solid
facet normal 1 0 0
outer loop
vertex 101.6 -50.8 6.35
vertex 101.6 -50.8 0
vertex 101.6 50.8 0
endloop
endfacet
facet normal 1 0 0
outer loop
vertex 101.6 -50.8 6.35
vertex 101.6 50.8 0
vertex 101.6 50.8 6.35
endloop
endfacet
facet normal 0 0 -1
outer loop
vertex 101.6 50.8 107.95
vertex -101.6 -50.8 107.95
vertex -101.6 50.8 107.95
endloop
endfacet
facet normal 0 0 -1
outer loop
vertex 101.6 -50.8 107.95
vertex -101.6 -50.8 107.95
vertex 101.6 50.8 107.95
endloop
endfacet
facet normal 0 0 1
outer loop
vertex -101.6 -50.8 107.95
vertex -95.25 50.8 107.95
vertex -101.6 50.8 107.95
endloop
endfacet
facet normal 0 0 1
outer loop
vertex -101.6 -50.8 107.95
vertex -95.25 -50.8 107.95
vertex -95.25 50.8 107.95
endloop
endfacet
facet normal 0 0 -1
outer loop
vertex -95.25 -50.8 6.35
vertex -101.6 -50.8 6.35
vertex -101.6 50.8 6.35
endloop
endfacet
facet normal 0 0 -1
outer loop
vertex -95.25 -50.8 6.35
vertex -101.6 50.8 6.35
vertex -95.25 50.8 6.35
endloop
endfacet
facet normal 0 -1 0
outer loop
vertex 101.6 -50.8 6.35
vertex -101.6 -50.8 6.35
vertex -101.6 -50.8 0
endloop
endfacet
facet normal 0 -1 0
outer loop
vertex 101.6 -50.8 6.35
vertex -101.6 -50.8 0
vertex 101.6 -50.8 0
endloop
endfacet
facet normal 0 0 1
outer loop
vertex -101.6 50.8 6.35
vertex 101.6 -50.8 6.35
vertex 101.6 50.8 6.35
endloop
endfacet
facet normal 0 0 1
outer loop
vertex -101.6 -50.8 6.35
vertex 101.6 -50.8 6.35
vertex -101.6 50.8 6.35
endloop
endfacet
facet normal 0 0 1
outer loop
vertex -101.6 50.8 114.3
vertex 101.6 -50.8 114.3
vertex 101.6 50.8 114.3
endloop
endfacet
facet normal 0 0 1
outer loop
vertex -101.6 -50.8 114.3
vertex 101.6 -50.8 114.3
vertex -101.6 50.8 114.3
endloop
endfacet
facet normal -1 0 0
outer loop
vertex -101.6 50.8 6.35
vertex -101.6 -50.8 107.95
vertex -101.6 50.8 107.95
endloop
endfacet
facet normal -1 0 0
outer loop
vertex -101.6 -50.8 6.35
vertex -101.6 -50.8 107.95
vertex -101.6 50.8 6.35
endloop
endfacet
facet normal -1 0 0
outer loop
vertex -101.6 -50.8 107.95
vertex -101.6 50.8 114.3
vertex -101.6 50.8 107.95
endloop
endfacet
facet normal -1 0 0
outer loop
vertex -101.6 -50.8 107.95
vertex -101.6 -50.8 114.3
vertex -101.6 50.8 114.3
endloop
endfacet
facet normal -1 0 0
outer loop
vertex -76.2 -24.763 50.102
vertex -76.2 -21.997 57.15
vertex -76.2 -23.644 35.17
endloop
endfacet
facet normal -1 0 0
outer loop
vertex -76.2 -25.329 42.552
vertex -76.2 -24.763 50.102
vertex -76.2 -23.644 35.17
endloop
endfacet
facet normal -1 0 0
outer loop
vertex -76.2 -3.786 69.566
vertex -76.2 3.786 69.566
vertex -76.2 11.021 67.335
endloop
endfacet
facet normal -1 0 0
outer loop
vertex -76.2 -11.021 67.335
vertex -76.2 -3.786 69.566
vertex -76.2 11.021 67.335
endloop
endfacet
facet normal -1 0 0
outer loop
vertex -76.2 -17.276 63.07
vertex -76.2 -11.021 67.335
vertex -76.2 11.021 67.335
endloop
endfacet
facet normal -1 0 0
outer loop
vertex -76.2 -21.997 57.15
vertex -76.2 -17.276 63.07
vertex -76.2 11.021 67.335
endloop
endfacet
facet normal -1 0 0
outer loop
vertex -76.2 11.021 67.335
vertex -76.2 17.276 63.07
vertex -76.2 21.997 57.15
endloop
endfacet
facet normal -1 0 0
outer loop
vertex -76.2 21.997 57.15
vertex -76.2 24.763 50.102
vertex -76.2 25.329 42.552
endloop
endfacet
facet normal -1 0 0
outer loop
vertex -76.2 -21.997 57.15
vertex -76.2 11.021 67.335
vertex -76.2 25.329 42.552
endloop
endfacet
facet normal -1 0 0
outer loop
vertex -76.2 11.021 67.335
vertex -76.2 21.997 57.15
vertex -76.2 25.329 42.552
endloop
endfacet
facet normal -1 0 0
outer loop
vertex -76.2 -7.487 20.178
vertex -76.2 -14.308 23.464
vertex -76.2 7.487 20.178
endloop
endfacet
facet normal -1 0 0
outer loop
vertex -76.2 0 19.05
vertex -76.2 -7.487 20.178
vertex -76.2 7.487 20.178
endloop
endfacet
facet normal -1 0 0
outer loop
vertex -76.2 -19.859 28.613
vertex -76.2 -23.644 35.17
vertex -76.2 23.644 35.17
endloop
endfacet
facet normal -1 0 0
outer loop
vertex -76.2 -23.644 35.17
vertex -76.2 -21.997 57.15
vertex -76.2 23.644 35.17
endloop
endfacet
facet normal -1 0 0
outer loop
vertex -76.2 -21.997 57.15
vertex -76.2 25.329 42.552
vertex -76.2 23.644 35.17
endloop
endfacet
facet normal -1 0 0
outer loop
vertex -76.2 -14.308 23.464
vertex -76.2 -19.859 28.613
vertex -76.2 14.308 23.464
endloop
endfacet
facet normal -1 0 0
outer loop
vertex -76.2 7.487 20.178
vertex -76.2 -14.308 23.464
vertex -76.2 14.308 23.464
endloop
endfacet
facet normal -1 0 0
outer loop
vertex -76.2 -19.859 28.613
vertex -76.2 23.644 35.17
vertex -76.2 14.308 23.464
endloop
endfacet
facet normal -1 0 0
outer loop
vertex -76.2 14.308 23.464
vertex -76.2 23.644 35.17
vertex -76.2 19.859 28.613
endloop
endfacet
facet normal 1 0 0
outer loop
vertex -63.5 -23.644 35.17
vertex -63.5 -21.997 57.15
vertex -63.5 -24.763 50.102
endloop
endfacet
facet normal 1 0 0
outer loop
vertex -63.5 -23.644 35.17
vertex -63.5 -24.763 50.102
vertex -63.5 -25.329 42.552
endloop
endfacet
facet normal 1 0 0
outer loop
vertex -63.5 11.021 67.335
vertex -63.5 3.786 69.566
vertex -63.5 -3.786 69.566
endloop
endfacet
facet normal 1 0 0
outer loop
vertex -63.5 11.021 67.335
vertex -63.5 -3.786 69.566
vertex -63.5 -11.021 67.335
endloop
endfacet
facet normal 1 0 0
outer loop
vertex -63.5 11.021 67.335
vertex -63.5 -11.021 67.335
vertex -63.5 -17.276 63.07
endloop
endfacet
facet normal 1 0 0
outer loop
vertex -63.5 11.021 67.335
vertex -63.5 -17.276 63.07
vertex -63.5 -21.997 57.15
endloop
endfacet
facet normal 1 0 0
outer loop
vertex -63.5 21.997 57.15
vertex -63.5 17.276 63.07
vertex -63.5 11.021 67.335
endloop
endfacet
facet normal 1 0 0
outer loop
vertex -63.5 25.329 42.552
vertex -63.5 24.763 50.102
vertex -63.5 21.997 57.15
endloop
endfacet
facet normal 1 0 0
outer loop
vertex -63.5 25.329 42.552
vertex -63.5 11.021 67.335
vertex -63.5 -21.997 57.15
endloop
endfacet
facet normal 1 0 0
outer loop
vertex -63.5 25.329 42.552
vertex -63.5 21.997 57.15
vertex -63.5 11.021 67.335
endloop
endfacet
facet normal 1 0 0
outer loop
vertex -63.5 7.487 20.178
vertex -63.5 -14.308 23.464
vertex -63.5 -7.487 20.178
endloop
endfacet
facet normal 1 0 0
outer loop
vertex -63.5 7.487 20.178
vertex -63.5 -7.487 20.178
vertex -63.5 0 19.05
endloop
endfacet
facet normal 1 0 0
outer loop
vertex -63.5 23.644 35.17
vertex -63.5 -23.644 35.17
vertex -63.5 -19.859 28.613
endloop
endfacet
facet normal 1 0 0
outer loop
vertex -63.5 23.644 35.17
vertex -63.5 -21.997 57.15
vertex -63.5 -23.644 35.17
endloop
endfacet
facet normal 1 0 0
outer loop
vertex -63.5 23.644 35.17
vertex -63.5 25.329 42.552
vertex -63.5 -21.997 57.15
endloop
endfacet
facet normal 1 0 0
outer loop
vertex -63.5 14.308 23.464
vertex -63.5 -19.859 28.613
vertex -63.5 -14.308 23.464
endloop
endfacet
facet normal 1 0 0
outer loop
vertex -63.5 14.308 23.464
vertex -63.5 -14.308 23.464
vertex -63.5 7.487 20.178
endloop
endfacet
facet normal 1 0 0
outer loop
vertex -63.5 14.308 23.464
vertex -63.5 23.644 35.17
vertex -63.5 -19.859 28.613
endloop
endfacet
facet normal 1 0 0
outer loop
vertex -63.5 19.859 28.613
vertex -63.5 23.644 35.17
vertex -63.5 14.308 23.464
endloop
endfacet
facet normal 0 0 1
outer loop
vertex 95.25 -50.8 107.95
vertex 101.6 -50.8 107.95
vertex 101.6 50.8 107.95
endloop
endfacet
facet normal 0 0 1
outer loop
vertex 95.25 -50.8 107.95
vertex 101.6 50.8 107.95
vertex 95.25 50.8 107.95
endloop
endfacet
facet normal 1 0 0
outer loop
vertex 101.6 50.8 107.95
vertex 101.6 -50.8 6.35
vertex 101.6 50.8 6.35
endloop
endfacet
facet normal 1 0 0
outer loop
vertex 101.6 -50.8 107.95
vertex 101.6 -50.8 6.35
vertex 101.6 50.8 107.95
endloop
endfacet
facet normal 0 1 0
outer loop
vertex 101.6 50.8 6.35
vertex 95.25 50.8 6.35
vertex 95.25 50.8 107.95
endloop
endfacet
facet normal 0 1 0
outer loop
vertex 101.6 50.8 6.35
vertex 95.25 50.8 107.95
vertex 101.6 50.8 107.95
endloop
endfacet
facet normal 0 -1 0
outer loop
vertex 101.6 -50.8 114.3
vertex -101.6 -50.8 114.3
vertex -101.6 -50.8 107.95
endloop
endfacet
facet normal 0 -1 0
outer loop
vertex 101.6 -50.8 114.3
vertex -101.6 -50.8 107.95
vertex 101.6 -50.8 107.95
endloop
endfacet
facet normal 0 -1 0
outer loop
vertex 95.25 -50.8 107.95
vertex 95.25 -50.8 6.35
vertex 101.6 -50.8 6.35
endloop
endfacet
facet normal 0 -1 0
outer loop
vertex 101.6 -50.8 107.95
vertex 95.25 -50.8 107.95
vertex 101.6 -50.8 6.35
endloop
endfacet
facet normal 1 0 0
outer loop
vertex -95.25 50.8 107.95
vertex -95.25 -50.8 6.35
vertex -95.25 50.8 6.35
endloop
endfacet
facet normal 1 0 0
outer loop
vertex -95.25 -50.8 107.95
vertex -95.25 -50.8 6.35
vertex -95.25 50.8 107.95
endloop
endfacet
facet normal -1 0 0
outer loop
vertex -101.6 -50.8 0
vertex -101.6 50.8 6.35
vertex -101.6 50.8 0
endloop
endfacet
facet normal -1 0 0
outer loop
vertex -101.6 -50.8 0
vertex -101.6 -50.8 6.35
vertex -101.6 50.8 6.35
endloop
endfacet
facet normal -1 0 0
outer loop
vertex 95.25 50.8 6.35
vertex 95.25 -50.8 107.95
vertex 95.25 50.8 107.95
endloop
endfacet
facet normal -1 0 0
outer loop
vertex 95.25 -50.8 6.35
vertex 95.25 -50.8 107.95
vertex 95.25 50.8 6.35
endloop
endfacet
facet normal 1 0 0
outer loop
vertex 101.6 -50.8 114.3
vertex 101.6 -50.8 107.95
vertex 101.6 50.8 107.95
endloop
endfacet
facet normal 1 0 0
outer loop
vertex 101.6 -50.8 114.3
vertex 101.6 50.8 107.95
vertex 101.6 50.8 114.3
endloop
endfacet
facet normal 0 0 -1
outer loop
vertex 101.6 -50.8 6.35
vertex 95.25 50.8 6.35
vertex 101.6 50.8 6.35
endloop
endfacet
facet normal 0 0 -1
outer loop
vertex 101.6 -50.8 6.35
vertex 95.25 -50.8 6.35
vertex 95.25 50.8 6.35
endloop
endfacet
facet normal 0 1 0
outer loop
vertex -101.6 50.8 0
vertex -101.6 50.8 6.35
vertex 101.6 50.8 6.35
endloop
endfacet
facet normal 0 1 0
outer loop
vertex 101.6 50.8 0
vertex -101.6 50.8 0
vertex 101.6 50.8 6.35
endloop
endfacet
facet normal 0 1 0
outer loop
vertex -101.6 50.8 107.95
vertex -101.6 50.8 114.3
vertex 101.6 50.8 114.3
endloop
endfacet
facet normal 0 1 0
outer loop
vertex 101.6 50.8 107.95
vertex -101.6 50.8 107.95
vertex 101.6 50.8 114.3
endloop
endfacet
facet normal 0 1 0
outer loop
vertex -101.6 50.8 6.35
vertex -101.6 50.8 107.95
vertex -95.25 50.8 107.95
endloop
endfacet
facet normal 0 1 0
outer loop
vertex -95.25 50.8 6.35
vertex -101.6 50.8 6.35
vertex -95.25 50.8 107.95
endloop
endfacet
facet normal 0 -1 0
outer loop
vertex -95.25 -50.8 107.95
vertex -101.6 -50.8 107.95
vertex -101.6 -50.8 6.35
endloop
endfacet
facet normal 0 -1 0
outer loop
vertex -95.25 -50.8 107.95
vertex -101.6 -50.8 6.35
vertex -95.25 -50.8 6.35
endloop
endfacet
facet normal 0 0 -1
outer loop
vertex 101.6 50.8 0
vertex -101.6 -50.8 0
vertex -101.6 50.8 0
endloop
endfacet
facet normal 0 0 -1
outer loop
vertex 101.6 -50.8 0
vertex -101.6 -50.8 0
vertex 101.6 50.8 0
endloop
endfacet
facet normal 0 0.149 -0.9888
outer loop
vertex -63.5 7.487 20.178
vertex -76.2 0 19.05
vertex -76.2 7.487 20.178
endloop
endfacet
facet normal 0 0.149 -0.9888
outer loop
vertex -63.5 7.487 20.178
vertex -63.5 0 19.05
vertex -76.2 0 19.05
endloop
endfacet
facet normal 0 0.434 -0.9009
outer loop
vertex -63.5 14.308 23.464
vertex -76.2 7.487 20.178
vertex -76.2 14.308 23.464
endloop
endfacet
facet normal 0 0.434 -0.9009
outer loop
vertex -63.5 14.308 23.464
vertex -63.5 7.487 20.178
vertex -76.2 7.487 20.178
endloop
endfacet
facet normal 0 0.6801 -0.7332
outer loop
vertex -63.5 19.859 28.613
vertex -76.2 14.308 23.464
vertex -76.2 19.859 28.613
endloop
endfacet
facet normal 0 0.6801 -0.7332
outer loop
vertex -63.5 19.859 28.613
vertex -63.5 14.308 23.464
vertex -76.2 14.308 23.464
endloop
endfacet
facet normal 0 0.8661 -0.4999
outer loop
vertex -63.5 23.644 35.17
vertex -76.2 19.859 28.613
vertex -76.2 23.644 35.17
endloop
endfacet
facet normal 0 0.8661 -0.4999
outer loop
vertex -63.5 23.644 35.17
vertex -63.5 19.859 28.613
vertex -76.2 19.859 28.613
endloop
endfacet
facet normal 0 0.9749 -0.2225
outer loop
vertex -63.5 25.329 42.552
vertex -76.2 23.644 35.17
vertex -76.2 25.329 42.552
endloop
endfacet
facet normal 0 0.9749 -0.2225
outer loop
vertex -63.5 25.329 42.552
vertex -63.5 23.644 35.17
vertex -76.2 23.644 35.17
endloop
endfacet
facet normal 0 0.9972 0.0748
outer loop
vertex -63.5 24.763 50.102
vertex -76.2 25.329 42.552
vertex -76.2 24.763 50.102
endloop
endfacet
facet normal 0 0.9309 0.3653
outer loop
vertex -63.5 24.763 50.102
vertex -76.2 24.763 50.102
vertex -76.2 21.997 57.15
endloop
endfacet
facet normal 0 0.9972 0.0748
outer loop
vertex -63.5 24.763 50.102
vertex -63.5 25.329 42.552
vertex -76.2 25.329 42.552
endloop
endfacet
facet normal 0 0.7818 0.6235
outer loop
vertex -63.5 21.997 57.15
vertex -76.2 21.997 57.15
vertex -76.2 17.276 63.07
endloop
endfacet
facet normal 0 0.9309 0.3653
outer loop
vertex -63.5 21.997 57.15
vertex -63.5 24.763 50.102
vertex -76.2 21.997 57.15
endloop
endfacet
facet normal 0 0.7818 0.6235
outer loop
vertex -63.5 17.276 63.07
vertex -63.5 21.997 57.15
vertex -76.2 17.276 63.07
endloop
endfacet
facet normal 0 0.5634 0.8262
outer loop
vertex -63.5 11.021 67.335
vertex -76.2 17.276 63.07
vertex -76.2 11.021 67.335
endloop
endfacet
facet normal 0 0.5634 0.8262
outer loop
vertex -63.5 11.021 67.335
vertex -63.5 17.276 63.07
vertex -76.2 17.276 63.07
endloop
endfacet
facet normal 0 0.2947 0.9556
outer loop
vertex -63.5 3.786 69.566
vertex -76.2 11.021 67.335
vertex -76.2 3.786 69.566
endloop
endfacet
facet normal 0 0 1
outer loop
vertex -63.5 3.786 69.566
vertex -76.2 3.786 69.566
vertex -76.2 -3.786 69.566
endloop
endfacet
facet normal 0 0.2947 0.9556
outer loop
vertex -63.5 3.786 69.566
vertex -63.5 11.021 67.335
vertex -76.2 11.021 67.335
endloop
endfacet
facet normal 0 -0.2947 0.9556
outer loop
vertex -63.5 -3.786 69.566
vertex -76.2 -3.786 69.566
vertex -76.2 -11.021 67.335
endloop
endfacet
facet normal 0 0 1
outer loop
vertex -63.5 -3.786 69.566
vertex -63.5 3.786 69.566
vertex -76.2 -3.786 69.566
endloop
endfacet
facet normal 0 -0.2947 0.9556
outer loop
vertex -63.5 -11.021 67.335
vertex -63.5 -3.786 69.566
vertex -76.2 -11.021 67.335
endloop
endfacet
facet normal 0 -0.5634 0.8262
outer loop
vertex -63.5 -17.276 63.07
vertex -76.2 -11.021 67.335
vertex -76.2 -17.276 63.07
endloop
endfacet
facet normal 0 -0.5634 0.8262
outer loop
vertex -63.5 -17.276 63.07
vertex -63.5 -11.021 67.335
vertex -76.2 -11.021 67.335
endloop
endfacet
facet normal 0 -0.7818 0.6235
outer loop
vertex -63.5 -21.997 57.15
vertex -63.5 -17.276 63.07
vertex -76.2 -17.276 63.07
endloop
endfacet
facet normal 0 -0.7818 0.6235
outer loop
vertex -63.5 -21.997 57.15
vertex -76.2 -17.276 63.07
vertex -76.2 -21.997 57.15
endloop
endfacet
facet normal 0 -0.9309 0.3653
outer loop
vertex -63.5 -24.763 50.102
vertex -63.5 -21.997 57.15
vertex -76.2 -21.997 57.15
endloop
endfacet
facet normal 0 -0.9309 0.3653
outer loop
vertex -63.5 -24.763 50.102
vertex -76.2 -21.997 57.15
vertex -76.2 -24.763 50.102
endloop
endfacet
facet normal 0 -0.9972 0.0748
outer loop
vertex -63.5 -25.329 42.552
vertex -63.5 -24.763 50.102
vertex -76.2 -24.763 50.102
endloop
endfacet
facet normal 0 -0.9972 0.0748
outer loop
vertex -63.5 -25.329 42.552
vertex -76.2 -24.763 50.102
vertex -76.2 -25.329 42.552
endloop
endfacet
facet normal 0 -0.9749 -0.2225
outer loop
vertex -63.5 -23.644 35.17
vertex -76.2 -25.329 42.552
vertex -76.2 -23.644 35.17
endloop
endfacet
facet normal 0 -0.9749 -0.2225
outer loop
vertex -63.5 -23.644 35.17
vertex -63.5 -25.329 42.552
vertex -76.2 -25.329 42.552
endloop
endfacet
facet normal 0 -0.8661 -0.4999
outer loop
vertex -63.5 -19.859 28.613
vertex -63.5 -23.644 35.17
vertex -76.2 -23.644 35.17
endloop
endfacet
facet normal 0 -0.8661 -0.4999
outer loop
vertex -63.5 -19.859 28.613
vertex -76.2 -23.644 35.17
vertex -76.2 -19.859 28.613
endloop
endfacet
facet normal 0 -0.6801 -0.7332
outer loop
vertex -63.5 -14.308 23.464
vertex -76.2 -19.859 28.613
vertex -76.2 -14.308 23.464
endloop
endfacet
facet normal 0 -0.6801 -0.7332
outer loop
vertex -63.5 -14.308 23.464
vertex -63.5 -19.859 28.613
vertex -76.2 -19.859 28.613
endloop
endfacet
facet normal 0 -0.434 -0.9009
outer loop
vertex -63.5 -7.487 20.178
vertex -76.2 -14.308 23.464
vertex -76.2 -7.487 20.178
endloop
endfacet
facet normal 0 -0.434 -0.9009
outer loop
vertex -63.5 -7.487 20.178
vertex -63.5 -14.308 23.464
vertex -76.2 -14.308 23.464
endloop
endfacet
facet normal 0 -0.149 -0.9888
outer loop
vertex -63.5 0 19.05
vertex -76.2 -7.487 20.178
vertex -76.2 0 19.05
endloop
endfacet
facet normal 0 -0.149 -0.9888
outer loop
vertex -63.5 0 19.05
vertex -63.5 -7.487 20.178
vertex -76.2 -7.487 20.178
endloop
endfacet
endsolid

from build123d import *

# Parameters (mm, degrees)
F2_DEPTH      = 50.8
F3_DEPTH      = 50.8
F3_DEPTH_BACK = 50.8
F1_W          = 12.7
F1_H          = 25.4


with BuildPart() as f2:
    # F1 (on Front) → F2 (new body, symmetric)
    with BuildSketch(Plane.XZ):
        Polygon((-101.6, 114.3), (-101.6, 107.95), (-95.25, 107.95), (95.25, 107.95), (101.6, 107.95), (101.6, 114.3), align=None)
    extrude(amount=F2_DEPTH, both=True)


with BuildPart() as f2b:
    # F1 (on Front) → F2, piece 2 (new body, symmetric)
    with BuildSketch(Plane.XZ):
        Polygon((-101.6, 6.35), (-101.6, 0), (101.6, 0), (101.6, 6.35), (95.25, 6.35), (-95.25, 6.35), align=None)
    extrude(amount=F2_DEPTH, both=True)


with BuildPart() as f3:
    # F1 (on Front) → F3 (new body, two sides)
    with BuildSketch(Plane.XZ) as f3_sk:
        Polygon((-101.6, 107.95), (-101.6, 6.35), (-95.25, 6.35), (-95.25, 57.15), (-95.25, 107.95), align=None)
    extrude(amount=F3_DEPTH)
    extrude(f3_sk.sketch, amount=-F3_DEPTH_BACK)


with BuildPart() as f3b:
    # F1 (on Front) → F3, piece 2 (new body, two sides)
    with BuildSketch(Plane.XZ) as f3_2_sk:
        Polygon((95.25, 6.35), (101.6, 6.35), (101.6, 107.95), (95.25, 107.95), (95.25, 57.15), align=None)
    extrude(amount=F3_DEPTH)
    extrude(f3_2_sk.sketch, amount=-F3_DEPTH_BACK)


with BuildPart() as f4:
    # F1 (on Front) → F4 (revolve)
    with BuildSketch(Plane.XZ):
        with Locations((-69.85, 31.75)):
            Rectangle(F1_W, F1_H)
    revolve(axis=Axis((-69.85, 0, 44.45), (1, 0, 0)))


solid = Compound([f2.part, f2b.part, f3.part, f3b.part, f4.part])
